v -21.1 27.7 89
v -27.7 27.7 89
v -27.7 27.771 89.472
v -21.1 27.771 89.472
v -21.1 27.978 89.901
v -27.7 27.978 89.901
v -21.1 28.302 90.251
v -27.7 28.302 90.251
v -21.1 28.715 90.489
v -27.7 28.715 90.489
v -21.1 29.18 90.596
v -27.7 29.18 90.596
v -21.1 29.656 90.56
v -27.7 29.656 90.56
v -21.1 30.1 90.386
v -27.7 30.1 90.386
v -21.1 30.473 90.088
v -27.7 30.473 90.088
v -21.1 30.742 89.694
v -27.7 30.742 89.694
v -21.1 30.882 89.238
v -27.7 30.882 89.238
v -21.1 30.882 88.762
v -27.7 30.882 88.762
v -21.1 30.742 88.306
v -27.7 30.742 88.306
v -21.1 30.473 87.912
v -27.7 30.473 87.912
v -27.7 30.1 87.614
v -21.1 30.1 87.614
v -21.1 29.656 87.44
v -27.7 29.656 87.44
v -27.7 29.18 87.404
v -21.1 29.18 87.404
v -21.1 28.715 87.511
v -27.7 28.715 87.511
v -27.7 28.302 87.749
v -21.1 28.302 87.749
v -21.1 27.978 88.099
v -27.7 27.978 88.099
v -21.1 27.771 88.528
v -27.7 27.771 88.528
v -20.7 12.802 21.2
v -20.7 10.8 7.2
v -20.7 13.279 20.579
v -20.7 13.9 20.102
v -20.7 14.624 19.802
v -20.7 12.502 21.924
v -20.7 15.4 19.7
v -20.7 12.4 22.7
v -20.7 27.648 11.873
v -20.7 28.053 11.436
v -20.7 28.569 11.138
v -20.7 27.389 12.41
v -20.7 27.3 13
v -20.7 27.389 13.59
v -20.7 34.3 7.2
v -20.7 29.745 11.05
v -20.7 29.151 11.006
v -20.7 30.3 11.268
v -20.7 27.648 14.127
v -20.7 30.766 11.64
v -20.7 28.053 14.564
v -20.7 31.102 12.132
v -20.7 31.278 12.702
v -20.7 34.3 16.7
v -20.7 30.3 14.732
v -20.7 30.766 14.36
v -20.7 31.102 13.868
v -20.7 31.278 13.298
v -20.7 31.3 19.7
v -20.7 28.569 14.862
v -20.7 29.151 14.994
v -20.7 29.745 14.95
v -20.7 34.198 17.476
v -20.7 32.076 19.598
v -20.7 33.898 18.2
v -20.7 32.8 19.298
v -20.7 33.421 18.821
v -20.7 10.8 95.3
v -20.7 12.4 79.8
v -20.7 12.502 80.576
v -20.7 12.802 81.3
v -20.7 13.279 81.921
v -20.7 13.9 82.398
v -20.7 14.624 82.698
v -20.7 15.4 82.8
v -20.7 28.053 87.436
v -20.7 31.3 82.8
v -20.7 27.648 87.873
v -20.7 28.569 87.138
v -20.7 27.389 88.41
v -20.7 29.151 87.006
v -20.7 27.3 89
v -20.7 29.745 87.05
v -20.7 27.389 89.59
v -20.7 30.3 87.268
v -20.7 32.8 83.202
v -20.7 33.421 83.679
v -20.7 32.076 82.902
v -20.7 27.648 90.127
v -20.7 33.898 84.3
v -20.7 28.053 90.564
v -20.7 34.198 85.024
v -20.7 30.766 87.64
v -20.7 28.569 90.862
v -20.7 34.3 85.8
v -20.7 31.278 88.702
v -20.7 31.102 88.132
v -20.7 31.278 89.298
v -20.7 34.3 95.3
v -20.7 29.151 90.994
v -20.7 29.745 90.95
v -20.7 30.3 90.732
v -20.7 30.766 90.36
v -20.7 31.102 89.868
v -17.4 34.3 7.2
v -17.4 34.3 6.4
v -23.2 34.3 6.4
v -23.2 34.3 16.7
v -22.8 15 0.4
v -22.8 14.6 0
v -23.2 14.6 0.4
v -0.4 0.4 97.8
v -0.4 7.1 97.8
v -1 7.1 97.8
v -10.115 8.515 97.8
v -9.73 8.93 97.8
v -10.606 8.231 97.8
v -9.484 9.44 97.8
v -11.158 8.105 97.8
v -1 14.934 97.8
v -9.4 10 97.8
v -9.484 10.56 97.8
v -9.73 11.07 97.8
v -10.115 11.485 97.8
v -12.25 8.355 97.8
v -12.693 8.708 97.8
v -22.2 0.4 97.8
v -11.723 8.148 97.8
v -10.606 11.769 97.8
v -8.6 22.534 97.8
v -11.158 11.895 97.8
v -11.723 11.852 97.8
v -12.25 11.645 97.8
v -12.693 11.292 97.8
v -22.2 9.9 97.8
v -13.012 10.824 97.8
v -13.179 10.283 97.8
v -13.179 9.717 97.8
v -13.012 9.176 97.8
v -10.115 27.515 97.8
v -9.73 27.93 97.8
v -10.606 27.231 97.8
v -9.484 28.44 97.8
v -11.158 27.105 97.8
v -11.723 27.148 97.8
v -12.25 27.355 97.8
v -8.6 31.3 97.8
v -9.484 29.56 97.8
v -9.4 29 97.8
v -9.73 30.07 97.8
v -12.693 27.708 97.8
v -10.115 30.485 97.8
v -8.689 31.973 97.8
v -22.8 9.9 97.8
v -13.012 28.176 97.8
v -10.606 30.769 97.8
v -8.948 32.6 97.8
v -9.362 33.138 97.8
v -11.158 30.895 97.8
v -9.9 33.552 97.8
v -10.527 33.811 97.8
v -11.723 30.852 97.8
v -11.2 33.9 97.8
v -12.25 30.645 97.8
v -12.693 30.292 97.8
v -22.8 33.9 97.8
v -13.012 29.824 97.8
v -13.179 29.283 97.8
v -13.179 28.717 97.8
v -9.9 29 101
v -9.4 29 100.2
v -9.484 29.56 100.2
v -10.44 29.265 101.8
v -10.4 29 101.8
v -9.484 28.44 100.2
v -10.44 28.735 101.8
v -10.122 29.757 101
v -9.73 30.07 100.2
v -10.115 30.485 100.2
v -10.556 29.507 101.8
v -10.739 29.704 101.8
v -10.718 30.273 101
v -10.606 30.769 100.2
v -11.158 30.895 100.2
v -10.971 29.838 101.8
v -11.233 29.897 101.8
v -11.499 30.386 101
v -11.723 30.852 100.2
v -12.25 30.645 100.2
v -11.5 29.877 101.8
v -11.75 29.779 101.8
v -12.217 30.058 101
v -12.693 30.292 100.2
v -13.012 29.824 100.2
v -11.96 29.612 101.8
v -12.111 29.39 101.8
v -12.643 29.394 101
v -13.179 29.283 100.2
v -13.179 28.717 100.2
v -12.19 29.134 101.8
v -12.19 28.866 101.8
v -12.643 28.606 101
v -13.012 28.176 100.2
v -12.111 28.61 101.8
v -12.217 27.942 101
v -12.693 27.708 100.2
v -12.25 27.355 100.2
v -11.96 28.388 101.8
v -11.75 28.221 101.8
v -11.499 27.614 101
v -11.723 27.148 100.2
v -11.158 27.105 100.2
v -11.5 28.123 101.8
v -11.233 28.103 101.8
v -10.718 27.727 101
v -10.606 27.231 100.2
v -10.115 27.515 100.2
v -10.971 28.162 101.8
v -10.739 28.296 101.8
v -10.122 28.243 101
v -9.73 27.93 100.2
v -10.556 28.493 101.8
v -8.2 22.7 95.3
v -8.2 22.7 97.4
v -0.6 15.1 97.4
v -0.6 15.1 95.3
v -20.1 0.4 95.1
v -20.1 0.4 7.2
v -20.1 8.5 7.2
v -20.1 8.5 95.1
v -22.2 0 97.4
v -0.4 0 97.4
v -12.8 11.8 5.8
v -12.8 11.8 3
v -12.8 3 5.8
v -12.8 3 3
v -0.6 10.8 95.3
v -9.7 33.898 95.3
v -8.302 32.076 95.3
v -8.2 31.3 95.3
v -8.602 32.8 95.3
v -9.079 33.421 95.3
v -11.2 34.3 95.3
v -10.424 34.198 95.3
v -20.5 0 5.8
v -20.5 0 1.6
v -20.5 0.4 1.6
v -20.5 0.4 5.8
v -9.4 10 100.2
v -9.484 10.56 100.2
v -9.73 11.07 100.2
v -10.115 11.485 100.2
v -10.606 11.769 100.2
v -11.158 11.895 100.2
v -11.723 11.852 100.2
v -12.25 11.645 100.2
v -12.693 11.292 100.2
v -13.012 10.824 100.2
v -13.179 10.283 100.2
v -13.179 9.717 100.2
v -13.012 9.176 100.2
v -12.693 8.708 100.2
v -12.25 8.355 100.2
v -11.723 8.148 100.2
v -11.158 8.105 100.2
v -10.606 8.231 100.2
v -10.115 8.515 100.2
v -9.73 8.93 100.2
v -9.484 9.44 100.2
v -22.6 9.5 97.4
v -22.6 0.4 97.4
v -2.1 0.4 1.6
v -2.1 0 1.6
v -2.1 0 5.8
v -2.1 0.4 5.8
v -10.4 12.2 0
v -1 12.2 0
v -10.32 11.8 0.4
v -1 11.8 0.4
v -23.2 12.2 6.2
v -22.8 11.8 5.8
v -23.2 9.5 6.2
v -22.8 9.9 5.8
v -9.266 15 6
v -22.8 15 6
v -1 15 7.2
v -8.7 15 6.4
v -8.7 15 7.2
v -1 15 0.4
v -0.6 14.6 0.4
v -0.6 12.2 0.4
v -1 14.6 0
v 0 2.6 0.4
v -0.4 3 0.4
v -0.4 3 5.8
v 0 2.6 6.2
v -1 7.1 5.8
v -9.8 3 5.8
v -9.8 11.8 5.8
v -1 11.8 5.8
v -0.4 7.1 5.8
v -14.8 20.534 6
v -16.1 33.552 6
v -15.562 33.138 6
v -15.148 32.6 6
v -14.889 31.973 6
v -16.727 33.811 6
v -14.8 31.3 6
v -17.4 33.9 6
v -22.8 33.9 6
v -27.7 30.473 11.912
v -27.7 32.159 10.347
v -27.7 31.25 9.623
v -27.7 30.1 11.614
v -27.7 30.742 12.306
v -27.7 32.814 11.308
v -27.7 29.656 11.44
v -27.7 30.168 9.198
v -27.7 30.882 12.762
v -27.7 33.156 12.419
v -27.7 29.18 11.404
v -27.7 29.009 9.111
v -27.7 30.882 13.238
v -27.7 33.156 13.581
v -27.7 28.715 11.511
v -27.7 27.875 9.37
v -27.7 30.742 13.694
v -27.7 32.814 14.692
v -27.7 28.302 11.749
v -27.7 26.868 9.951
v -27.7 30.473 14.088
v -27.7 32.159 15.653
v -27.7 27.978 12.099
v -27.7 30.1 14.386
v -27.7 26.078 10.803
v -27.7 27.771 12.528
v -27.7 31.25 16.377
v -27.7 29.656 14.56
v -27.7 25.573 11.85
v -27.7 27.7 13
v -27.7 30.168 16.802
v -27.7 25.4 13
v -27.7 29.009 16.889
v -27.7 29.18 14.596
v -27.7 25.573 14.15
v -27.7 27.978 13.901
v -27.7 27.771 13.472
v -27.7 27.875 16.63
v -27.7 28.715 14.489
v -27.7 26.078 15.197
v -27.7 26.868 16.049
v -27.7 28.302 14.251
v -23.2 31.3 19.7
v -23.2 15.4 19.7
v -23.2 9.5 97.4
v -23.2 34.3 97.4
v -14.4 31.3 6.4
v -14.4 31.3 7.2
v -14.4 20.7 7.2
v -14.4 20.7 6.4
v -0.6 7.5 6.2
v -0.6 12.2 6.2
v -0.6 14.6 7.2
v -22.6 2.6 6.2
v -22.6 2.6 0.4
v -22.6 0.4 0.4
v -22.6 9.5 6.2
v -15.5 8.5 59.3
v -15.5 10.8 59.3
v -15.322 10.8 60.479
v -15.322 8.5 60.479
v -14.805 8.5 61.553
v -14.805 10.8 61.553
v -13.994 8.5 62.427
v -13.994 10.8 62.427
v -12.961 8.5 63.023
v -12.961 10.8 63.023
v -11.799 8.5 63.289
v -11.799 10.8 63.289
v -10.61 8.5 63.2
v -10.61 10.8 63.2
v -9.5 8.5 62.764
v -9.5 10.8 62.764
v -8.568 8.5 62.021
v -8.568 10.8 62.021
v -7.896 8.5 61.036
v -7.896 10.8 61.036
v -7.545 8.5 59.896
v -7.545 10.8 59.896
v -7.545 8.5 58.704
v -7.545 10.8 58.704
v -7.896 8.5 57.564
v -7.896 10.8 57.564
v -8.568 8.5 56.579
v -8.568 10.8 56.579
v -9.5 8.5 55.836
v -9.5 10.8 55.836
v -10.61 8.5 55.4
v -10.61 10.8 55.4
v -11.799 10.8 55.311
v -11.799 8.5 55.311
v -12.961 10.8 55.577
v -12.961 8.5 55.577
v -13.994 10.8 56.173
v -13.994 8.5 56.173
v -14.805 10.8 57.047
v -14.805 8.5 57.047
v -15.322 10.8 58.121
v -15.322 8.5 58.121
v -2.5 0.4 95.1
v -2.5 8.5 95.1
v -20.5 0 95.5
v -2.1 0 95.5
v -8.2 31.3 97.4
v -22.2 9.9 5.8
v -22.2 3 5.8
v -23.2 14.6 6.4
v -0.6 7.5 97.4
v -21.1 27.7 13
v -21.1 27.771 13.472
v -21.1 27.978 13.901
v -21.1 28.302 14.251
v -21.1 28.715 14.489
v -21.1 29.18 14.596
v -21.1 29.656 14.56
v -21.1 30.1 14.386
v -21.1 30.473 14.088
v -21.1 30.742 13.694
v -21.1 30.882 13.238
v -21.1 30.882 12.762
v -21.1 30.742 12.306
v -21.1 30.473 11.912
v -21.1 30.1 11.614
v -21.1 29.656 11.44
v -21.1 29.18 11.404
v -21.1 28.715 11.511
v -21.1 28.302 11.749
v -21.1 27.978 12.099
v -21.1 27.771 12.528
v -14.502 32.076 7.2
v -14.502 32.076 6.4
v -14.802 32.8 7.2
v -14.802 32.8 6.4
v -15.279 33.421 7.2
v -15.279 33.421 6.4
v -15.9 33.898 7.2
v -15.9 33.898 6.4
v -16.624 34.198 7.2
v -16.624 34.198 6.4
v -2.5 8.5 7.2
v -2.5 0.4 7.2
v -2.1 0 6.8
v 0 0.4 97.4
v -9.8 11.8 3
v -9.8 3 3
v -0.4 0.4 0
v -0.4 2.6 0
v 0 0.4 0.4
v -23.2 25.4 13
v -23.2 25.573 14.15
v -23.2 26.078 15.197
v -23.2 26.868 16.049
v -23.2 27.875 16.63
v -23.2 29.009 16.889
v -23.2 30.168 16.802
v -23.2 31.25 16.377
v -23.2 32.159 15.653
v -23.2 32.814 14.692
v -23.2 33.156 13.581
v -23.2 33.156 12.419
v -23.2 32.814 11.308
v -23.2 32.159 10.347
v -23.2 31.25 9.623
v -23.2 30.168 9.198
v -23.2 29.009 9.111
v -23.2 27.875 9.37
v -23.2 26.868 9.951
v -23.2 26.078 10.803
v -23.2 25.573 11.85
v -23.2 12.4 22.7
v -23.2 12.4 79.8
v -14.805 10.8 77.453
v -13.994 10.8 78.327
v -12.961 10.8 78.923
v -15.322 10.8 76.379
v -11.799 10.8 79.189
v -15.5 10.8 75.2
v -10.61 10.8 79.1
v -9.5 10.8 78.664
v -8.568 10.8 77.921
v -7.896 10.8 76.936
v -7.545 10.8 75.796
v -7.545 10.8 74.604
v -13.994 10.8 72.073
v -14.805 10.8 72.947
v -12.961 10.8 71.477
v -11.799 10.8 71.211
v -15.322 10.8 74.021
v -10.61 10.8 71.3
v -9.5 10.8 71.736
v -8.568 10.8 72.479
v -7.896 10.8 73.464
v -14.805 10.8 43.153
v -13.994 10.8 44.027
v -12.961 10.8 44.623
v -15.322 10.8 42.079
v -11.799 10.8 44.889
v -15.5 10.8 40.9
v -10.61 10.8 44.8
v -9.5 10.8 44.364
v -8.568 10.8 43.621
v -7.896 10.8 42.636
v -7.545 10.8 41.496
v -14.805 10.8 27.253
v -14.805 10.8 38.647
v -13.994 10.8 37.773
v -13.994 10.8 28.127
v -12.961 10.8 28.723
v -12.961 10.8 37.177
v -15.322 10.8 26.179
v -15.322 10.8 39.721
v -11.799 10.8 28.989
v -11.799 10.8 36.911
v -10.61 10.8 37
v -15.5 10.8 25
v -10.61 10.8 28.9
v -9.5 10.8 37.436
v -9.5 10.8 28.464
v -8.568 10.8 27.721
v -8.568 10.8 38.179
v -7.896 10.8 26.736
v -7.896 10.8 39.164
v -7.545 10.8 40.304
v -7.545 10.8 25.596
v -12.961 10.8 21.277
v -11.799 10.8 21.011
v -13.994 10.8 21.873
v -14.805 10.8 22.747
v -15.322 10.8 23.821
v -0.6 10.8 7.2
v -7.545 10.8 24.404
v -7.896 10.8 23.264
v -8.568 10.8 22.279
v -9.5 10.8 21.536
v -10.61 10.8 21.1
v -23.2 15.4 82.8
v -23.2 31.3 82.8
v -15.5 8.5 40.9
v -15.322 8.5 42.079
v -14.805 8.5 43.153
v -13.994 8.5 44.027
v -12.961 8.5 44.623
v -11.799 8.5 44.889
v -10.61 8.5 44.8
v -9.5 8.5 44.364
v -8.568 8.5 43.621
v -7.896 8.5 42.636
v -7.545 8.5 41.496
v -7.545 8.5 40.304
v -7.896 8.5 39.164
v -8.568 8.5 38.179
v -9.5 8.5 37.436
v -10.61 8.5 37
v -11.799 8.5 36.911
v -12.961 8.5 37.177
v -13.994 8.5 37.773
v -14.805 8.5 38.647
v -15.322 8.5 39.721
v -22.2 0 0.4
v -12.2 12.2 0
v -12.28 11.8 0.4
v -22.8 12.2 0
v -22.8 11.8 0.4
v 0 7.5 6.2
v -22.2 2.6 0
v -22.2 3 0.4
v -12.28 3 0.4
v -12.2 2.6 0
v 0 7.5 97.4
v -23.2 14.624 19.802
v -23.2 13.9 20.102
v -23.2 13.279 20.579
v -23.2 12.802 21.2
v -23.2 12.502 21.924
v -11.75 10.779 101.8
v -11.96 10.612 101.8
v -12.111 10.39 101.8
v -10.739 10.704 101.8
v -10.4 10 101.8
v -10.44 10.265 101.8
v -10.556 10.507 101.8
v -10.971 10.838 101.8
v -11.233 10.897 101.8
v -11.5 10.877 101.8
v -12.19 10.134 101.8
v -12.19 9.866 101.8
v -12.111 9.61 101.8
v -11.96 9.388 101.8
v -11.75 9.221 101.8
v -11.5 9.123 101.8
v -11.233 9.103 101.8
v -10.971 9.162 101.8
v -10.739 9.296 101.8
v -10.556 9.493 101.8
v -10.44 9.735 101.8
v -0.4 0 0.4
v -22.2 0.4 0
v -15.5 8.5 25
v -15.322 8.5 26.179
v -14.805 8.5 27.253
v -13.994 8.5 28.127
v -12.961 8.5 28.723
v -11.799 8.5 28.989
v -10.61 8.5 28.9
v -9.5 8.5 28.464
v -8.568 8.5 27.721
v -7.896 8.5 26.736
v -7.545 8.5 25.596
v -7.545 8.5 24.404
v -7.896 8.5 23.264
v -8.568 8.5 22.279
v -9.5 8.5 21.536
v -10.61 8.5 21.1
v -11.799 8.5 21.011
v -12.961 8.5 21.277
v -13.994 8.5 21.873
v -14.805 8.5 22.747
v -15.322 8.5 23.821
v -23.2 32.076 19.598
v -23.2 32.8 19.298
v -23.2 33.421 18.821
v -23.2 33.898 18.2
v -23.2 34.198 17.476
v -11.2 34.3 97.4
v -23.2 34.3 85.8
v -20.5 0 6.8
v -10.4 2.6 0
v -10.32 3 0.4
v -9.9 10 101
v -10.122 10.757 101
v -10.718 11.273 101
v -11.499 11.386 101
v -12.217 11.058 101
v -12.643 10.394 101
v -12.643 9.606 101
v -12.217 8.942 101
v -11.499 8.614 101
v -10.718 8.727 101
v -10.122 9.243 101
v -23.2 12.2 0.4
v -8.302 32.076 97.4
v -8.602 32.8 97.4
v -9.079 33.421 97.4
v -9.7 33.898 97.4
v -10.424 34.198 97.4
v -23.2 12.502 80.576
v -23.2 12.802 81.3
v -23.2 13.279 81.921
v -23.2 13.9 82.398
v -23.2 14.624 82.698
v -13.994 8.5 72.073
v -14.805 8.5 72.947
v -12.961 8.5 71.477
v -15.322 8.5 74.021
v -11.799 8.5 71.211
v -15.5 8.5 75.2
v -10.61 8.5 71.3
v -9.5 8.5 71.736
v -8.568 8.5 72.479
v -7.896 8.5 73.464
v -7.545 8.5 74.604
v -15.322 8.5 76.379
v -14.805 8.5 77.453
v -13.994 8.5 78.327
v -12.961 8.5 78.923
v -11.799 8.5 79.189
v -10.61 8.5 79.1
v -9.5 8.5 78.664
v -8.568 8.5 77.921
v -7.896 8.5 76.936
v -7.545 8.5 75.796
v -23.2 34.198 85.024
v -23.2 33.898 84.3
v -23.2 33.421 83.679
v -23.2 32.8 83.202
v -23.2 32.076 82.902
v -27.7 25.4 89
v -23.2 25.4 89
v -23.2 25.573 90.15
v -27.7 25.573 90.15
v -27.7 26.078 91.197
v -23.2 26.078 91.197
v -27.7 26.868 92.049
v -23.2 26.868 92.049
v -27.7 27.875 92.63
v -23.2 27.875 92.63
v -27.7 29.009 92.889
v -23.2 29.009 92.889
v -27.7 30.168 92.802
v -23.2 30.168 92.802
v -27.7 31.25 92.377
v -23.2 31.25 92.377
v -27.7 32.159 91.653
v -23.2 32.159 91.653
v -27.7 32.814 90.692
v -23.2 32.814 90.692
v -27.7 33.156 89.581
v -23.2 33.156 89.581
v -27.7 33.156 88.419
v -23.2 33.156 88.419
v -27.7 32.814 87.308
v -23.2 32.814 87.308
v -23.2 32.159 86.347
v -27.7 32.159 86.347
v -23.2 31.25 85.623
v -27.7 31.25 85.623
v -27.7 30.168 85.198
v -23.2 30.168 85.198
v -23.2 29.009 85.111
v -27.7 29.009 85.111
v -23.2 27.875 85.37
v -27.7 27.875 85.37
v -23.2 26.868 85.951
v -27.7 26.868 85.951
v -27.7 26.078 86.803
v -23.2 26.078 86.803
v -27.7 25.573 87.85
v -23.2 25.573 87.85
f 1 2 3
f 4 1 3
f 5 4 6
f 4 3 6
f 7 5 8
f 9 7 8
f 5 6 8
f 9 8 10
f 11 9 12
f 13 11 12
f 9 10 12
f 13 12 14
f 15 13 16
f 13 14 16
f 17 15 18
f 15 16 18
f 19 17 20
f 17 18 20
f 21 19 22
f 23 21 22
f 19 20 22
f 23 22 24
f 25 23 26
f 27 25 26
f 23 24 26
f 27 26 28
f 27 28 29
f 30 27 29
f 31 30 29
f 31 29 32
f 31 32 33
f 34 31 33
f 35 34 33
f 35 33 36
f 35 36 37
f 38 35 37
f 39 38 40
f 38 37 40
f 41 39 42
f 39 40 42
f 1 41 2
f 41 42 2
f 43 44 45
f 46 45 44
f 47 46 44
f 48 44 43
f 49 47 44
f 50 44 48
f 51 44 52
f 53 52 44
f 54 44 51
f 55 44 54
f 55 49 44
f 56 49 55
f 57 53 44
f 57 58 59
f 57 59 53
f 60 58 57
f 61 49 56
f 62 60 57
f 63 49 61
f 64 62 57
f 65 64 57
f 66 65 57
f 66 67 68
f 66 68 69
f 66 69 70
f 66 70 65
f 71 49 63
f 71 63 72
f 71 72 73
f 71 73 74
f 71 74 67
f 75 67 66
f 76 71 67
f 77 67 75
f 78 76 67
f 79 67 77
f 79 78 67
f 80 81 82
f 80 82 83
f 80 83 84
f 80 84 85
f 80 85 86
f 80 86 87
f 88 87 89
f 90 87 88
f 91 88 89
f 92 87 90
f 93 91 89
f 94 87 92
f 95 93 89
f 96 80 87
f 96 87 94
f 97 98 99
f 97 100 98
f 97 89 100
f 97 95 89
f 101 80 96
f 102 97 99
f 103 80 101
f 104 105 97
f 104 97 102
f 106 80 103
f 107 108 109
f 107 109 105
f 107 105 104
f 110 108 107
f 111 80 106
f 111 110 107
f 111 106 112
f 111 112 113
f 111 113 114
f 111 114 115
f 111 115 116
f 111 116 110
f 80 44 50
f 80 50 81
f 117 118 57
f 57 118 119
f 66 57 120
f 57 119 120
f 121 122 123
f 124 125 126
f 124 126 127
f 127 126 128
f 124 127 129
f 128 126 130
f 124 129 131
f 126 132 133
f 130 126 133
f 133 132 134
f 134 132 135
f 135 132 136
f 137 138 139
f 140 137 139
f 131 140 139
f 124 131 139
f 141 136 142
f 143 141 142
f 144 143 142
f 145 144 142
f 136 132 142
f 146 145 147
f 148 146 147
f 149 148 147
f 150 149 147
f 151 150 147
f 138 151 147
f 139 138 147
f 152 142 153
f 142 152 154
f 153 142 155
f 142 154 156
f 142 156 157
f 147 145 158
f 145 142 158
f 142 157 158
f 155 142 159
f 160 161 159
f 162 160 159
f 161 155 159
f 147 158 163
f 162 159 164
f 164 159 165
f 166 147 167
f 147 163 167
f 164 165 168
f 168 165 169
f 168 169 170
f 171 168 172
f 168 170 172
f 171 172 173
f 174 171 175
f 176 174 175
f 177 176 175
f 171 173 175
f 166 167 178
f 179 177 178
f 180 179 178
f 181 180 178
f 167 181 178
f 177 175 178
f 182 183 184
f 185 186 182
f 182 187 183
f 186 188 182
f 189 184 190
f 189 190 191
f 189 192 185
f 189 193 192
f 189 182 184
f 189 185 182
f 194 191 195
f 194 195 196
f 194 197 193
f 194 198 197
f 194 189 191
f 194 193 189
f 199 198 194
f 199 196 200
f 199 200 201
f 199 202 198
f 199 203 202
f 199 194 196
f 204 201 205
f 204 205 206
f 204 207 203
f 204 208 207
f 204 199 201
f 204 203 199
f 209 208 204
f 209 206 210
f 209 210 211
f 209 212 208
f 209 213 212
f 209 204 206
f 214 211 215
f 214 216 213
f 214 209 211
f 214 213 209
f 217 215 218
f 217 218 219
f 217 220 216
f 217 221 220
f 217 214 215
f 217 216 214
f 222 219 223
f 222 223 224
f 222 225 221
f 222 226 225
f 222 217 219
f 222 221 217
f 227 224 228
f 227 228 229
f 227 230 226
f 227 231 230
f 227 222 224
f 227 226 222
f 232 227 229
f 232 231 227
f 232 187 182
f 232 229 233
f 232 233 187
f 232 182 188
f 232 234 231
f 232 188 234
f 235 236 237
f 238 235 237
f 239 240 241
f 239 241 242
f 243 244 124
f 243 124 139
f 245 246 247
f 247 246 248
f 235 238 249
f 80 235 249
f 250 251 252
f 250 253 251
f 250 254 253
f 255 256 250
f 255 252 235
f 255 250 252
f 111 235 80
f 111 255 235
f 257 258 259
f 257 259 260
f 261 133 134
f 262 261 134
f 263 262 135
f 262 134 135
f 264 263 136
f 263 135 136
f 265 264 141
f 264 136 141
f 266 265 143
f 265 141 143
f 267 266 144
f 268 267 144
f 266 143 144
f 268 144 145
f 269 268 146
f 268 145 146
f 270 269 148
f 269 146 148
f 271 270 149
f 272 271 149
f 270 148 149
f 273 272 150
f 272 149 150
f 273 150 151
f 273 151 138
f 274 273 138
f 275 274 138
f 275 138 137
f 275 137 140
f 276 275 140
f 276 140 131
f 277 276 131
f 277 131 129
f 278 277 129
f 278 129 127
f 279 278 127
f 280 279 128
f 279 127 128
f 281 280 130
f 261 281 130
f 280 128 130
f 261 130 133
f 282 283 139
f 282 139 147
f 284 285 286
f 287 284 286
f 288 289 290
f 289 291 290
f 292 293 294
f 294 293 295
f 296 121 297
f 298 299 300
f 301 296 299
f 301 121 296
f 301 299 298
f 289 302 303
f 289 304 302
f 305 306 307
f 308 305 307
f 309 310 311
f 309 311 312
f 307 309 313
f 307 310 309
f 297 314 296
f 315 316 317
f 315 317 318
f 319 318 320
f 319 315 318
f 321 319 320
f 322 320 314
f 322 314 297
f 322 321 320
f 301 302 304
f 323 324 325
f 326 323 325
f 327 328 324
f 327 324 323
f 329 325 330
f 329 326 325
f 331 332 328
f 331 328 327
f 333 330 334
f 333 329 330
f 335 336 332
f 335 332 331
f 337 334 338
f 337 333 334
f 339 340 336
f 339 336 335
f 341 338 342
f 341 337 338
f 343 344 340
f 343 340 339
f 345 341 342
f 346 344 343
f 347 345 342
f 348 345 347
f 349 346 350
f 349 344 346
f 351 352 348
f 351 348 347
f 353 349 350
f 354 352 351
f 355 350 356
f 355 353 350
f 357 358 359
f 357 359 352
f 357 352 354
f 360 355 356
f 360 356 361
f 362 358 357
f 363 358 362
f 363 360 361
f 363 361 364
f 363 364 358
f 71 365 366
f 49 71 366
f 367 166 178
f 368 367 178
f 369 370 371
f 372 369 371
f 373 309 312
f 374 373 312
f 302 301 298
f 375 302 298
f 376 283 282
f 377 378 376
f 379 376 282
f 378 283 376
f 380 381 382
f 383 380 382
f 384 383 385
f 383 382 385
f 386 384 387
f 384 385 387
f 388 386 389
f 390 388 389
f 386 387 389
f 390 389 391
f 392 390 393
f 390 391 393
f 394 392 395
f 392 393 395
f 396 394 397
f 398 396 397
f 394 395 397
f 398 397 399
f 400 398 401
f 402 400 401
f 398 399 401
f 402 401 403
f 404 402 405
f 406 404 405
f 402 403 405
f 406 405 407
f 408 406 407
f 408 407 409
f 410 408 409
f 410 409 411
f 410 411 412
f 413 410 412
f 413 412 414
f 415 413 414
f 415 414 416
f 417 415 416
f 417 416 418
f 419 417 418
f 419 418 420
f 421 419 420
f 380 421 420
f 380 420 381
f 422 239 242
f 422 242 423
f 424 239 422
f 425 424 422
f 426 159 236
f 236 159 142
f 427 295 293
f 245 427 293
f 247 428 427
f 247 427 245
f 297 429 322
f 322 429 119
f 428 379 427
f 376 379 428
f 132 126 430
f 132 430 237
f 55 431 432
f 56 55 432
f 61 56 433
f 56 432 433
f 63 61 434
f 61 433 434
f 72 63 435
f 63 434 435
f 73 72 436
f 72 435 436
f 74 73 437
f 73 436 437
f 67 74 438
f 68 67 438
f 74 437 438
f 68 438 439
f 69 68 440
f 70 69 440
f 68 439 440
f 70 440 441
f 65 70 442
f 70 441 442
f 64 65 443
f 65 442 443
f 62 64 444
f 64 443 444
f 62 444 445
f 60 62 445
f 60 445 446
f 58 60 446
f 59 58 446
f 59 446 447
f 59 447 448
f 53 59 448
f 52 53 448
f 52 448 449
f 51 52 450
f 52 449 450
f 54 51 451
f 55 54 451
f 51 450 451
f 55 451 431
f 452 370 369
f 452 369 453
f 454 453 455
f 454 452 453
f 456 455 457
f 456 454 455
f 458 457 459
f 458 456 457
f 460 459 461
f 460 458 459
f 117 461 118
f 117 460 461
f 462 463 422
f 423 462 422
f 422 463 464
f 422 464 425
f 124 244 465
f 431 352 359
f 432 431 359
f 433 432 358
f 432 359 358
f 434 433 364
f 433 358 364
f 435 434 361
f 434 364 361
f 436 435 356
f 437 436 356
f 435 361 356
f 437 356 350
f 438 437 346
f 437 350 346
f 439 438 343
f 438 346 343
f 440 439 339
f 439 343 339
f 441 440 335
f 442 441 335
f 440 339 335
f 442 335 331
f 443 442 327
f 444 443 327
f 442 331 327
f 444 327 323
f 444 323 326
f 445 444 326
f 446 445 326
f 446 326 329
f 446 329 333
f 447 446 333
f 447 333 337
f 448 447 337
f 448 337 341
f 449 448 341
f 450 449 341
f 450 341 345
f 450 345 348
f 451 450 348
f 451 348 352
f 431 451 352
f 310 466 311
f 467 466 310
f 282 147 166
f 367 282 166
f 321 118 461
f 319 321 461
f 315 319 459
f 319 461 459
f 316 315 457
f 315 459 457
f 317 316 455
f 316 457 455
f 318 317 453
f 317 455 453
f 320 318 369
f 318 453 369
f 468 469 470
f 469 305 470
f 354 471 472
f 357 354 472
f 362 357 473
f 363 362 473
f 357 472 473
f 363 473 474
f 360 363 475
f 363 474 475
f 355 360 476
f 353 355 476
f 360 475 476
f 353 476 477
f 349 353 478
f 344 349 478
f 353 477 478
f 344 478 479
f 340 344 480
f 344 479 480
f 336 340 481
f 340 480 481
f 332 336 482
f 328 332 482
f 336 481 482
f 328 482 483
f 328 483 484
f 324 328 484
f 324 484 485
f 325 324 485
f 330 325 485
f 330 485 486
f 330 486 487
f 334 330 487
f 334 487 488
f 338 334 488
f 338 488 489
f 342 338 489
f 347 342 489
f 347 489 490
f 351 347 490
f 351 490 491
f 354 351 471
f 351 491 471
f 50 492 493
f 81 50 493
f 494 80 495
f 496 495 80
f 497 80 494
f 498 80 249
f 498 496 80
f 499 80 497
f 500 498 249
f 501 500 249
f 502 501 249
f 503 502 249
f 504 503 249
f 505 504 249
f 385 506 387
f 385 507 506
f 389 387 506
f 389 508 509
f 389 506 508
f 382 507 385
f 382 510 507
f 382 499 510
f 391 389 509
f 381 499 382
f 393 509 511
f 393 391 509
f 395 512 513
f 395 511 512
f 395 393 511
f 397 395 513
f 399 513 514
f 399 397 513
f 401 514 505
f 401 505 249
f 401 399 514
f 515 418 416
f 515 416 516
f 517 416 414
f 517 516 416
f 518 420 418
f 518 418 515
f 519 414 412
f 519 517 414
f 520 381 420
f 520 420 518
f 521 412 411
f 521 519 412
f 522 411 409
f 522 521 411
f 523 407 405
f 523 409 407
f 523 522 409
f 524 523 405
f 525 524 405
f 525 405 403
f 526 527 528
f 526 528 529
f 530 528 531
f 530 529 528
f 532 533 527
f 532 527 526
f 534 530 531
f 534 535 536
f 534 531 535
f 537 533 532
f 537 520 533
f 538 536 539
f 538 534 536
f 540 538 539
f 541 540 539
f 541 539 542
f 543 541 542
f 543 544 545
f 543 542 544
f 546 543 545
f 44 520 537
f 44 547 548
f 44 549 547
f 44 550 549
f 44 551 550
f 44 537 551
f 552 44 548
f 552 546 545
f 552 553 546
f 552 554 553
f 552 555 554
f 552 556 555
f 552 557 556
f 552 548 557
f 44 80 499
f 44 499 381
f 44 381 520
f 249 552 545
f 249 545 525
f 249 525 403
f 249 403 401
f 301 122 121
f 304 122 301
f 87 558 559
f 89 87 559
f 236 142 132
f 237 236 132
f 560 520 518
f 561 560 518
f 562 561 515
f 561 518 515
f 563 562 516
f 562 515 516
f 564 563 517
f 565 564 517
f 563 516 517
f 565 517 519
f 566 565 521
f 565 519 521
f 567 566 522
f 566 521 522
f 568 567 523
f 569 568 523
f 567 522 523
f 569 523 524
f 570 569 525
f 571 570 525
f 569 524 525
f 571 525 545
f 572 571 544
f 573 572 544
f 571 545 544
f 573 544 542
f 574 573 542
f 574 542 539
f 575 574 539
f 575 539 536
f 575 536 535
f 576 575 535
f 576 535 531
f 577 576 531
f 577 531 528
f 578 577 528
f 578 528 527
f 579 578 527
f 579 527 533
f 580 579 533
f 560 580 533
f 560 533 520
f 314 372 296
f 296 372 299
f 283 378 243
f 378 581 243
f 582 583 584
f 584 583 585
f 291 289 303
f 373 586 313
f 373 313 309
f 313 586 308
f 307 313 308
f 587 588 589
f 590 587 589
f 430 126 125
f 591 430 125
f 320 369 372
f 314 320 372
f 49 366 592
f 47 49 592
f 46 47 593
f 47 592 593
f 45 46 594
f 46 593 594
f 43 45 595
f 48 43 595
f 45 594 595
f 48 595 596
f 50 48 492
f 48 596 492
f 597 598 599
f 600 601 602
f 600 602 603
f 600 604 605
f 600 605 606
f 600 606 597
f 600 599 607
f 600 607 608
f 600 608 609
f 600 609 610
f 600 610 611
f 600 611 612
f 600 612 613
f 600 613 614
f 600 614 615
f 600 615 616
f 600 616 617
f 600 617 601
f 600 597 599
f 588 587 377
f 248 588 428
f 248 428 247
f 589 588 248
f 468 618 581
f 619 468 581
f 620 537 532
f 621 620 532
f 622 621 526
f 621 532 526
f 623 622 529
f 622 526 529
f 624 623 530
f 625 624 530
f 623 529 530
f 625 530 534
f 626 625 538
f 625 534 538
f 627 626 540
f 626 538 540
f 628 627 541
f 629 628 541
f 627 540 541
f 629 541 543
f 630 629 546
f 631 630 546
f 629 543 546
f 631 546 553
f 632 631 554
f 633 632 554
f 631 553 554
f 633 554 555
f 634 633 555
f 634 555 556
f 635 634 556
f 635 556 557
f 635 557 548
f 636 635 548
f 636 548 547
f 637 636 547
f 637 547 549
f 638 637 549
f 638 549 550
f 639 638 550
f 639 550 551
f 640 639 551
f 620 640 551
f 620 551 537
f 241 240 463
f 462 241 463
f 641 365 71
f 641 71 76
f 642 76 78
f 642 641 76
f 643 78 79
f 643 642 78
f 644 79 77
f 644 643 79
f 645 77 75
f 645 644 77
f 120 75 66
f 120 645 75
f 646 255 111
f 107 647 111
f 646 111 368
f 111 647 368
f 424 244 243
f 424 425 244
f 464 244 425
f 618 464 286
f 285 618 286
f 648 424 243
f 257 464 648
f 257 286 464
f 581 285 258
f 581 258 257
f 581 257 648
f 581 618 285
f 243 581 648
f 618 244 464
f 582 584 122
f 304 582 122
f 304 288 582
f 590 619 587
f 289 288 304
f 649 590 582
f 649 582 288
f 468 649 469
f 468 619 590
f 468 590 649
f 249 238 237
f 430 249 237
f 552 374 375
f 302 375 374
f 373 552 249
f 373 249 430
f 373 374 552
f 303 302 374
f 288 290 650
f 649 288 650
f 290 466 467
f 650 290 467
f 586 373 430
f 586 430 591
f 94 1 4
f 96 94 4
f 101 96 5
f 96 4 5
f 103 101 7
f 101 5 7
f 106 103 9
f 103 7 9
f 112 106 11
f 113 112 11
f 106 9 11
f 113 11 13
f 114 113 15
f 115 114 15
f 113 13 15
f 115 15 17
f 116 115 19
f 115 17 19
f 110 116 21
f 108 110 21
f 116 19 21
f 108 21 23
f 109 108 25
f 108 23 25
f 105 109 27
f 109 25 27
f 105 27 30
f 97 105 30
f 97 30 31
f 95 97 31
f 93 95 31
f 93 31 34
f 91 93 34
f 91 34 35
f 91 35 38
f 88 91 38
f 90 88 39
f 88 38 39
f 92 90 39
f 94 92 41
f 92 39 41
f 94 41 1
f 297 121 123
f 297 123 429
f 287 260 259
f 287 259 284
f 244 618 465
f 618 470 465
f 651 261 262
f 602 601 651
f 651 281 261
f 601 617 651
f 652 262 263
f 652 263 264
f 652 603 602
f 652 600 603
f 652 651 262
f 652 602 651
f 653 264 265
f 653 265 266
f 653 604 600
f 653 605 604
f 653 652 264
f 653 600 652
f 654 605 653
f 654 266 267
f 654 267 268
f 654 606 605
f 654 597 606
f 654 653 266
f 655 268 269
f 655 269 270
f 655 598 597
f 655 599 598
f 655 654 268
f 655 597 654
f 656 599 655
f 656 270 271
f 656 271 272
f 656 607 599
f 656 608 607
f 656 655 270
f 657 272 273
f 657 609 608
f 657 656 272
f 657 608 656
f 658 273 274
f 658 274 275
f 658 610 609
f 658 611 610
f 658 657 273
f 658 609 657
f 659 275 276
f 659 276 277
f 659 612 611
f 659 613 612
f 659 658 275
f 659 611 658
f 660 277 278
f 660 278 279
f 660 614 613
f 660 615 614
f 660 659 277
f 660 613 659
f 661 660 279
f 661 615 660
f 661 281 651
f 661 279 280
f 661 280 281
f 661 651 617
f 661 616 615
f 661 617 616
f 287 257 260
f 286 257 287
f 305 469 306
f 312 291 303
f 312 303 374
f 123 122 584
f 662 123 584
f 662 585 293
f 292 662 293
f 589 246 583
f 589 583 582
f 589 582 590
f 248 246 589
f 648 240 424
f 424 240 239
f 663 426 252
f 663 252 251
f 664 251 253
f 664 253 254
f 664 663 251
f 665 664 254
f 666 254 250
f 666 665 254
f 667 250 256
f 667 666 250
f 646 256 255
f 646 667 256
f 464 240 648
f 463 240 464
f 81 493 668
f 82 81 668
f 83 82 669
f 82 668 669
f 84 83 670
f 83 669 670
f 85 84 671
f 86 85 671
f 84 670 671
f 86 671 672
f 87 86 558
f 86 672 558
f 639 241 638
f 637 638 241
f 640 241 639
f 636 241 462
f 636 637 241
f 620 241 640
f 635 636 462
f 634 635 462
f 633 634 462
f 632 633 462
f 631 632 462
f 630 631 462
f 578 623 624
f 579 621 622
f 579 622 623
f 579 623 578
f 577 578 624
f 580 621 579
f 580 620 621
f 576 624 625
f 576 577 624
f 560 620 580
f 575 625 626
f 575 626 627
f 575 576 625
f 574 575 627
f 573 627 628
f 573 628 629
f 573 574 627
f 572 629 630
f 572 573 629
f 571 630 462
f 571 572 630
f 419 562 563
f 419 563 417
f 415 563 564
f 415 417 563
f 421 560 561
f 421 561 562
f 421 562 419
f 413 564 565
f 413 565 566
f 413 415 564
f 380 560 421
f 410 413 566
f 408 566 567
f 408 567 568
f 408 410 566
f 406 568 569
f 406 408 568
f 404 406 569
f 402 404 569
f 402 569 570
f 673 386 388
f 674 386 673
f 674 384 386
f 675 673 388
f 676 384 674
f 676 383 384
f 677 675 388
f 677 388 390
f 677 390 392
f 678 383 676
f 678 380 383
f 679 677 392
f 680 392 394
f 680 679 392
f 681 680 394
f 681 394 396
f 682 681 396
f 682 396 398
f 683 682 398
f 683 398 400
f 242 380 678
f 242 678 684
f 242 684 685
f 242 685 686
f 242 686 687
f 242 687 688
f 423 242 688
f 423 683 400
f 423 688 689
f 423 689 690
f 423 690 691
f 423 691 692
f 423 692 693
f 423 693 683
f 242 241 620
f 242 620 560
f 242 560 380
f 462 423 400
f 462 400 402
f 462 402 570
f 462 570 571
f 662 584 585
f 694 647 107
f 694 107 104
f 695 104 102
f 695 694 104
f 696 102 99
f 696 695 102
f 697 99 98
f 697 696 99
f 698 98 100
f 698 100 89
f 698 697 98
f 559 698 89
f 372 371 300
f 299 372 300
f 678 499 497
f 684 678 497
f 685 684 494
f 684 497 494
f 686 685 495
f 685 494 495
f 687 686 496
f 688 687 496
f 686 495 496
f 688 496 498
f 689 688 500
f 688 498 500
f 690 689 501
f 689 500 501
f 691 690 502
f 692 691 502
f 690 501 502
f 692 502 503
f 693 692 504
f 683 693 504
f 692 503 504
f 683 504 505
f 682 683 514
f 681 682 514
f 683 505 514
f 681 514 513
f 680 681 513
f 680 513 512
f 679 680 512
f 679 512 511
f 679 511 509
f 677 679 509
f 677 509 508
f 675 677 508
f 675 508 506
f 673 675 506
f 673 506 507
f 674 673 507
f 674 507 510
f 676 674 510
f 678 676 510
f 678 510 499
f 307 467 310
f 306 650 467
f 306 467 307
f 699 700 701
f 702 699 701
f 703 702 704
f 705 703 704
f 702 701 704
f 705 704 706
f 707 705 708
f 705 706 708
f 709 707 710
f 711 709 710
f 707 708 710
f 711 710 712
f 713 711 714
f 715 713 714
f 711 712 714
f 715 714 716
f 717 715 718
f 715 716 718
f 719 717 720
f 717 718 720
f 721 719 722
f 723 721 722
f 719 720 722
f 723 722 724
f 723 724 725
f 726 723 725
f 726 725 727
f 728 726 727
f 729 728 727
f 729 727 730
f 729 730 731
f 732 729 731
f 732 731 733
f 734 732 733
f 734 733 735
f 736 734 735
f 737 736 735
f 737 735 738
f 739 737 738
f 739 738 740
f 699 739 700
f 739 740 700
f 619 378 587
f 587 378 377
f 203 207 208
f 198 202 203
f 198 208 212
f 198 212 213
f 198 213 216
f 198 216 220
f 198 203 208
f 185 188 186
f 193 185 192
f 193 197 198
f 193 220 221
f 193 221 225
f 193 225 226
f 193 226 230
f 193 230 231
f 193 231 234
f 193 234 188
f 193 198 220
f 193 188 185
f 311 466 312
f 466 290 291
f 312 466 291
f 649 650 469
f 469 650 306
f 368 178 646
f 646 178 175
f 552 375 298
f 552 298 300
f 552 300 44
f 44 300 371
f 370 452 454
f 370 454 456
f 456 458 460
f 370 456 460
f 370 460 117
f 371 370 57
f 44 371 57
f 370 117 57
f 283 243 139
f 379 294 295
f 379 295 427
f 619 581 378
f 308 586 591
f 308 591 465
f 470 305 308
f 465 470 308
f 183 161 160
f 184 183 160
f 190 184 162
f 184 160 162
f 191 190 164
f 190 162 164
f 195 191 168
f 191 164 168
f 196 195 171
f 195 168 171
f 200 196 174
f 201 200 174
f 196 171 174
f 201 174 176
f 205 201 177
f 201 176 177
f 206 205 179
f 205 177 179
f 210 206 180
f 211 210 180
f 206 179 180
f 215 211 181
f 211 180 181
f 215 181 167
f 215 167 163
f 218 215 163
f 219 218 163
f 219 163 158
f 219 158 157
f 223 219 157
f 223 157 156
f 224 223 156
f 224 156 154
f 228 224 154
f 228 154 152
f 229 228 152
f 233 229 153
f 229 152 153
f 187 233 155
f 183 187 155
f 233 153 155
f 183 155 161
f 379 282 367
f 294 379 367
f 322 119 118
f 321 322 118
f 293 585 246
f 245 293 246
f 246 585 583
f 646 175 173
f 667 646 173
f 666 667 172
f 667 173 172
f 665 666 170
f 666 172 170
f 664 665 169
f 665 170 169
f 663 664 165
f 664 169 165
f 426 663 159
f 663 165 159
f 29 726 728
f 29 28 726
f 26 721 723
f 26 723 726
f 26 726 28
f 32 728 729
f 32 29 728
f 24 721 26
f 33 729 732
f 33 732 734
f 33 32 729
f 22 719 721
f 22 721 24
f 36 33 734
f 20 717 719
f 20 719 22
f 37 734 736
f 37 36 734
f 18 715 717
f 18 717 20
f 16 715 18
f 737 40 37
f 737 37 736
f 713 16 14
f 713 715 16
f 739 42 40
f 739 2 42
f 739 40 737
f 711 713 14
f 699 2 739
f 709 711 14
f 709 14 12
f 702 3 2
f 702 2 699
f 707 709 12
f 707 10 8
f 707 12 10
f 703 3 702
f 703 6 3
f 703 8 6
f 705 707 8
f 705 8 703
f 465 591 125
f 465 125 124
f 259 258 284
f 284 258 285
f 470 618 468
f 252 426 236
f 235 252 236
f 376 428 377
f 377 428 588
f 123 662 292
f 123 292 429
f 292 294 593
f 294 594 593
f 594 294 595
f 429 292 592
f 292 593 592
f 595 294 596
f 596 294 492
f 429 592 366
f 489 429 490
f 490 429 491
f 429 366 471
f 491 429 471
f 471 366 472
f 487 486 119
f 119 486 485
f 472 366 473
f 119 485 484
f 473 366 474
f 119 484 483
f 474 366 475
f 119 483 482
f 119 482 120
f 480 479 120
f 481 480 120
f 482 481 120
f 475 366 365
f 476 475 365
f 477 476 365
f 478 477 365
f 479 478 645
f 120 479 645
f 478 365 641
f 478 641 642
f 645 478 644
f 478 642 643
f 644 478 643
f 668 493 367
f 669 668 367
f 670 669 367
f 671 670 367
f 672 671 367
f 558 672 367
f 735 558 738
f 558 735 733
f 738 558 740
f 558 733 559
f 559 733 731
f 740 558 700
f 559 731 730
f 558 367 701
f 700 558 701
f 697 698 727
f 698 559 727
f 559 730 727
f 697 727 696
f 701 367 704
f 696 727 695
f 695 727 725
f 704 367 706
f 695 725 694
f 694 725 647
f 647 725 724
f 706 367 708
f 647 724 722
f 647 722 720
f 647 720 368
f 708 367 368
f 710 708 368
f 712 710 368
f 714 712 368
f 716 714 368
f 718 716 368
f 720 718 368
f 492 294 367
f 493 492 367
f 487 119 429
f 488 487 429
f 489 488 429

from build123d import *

# Parameters (mm, degrees)
PAD_DEPTH          = 97.8
PAD001_DEPTH       = 2.5
SKETCH002_W        = 22.6
SKETCH002_H        = 4.2
PAD002_DEPTH       = 7.2
PAD003_DEPTH       = 1.2
PAD004_DEPTH       = 2.5
SKETCH005_W        = 10.4
SKETCH005_H        = 8.8
SKETCH005_W_2      = 9.8
POCKET_DEPTH       = 5.8
CHAMFER_SIZE2      = 3
CHAMFER_SIZE       = 0.6
CHAMFER001_SIZE2   = 3
CHAMFER001_SIZE    = 0.6
SKETCH006_R        = 3.9
PAD005_DEPTH       = 4.5
SKETCH007_R        = 1.6
POCKET001_DEPTH    = 5
SKETCH008_R        = 1.9
PAD006_DEPTH       = 4
CHAMFER002_1_SIZE2 = 1
CHAMFER002_1_SIZE  = 1.6
CHAMFER002_2_SIZE2 = 1
CHAMFER002_2_SIZE  = 1.6
SKETCH009_W        = 18.4
SKETCH009_H        = 4.2
POCKET002_DEPTH    = 0.4
SKETCH010_W        = 17.6
SKETCH010_H        = 87.9
POCKET003_DEPTH    = 8.5
CHAMFER003_SIZE    = 0.4
CHAMFER004_SIZE    = 0.4
CHAMFER005_SIZE    = 0.4
SKETCH011_R        = 4
POCKET004_DEPTH    = 5


with BuildPart() as part:
    # Sketch → Pad (new body)
    with BuildSketch(Plane.XY):
        Polygon((-22.6, 0), (-22.6, 9.5), (-23.2, 9.5), (-23.2, 10.8), (-0.6, 10.8), (-0.6, 7.5), (0, 7.5), (0, 0), align=None)
    extrude(amount=PAD_DEPTH)

    # Sketch001 (on Face10 of Pad) → Pad001 (join)
    with BuildSketch(Plane.XY.offset(97.8)):
        with BuildLine():
            Line((-23.2, 10.8), (-23.2, 34.3))
            Line((-23.2, 34.3), (-11.2, 34.3))
            ThreePointArc((-8.2, 31.3), (-9.07868, 33.42132), (-11.2, 34.3))
            Line((-8.2, 31.3), (-8.2, 22.7))
            Line((-8.2, 22.7), (-0.6, 15.1))
            Line((-0.6, 15.1), (-0.6, 10.8))
            Line((-0.6, 10.8), (-23.2, 10.8))
        make_face()
    extrude(amount=-PAD001_DEPTH)

    # Sketch002 (on Face4 of Pad001) → Pad002 (join)
    with BuildSketch(Plane(origin=(0, 0, 0), x_dir=(1, 0, 0), z_dir=(0, 0, -1))):
        with Locations((-11.9, -12.9)):
            Rectangle(SKETCH002_W, SKETCH002_H)
    extrude(amount=-PAD002_DEPTH)

    # Sketch003 (on Face22 of Pad002) → Pad003 (join)
    with BuildSketch(Plane.XY.offset(7.2)):
        with BuildLine():
            Line((-23.2, 15), (-23.2, 34.3))
            Line((-23.2, 34.3), (-17.4, 34.3))
            ThreePointArc((-14.4, 31.3), (-15.27868, 33.42132), (-17.4, 34.3))
            Line((-14.4, 31.3), (-14.4, 20.7))
            Line((-14.4, 20.7), (-8.7, 15))
            Line((-8.7, 15), (-23.2, 15))
        make_face()
    extrude(amount=-PAD003_DEPTH)

    # Sketch004 (on Face7 of Pad003) → Pad004 (join)
    with BuildSketch(Plane(origin=(-23.2, 0, 0), x_dir=(0, -1, 0), z_dir=(-1, 0, 0))):
        with BuildLine():
            Line((-34.3, 7.2), (-34.3, 16.7))
            ThreePointArc((-31.3, 19.7), (-33.42132, 18.82132), (-34.3, 16.7))
            Line((-31.3, 19.7), (-15.4, 19.7))
            ThreePointArc((-15.4, 19.7), (-13.27868, 20.57868), (-12.4, 22.7))
            Line((-12.4, 22.7), (-12.4, 79.8))
            ThreePointArc((-12.4, 79.8), (-13.27868, 81.92132), (-15.4, 82.8))
            Line((-15.4, 82.8), (-31.3, 82.8))
            ThreePointArc((-34.3, 85.8), (-33.42132, 83.67868), (-31.3, 82.8))
            Line((-34.3, 85.8), (-34.3, 95.3))
            Line((-34.3, 95.3), (-10.8, 95.3))
            Line((-10.8, 95.3), (-10.8, 7.2))
            Line((-10.8, 7.2), (-34.3, 7.2))
        make_face()
    extrude(amount=-PAD004_DEPTH)

    # Sketch005 (on Face4 of Pad004) → Pocket (cut)
    with BuildSketch(Plane(origin=(0, 0, 0), x_dir=(1, 0, 0), z_dir=(0, 0, -1))):
        with Locations((-18, -7.4)):
            Rectangle(SKETCH005_W, SKETCH005_H)
        with Locations((-4.9, -7.4)):
            Rectangle(SKETCH005_W_2, SKETCH005_H)
    extrude(amount=-POCKET_DEPTH, mode=Mode.SUBTRACT)

    # Chamfer
    chamfer_edges = [part.edges().sort_by_distance(p)[0] for p in [
        (-9.8, 6.9, 0),
    ]]
    chamfer_side = part.faces().sort_by_distance((-11.3, 2.885526, 0))[0]
    chamfer(chamfer_edges, length=CHAMFER_SIZE, length2=CHAMFER_SIZE2, reference=chamfer_side)

    # Chamfer001
    chamfer001_edges = [part.edges().sort_by_distance(p)[0] for p in [
        (-12.8, 6.9, 0),
    ]]
    chamfer001_side = part.faces().sort_by_distance((-11.36491, 2.668377, 0))[0]
    chamfer(chamfer001_edges, length=CHAMFER001_SIZE, length2=CHAMFER001_SIZE2, reference=chamfer001_side)

    # Sketch006 (on Face25 of Chamfer001) → Pad005 (join)
    with BuildSketch(Plane(origin=(-23.2, 0, 0), x_dir=(0, -1, 0), z_dir=(-1, 0, 0))):
        with Locations((-29.3, 89)):
            Circle(SKETCH006_R)
        with Locations((-29.3, 13)):
            Circle(SKETCH006_R)
    extrude(amount=PAD005_DEPTH)

    # Sketch007 (on Face25 of Pad005) → Pocket001 (cut, symmetric)
    with BuildSketch(Plane(origin=(-23.2, 0, 0), x_dir=(0, -1, 0), z_dir=(-1, 0, 0))):
        with Locations((-29.3, 13)):
            Circle(SKETCH007_R)
        with Locations((-29.3, 89)):
            Circle(SKETCH007_R)
    extrude(amount=POCKET001_DEPTH, both=True, mode=Mode.SUBTRACT)

    # Sketch008 (on Face22 of Pocket001) → Pad006 (join)
    with BuildSketch(Plane.XY.offset(97.8)):
        with Locations((-11.3, 10)):
            Circle(SKETCH008_R)
        with Locations((-11.3, 29)):
            Circle(SKETCH008_R)
    extrude(amount=PAD006_DEPTH)

    # Chamfer002 1
    chamfer002_1_edges = [part.edges().sort_by_distance(p)[0] for p in [
        (-13.2, 29, 101.8),
    ]]
    chamfer002_1_side = part.faces().sort_by_distance((-13.2, 29, 99.8))[0]
    chamfer(chamfer002_1_edges, length=CHAMFER002_1_SIZE, length2=CHAMFER002_1_SIZE2, reference=chamfer002_1_side)

    # Chamfer002 2
    chamfer002_2_edges = [part.edges().sort_by_distance(p)[0] for p in [
        (-13.2, 10, 101.8),
    ]]
    chamfer002_2_side = part.faces().sort_by_distance((-13.2, 10, 99.8))[0]
    chamfer(chamfer002_2_edges, length=CHAMFER002_2_SIZE, length2=CHAMFER002_2_SIZE2, reference=chamfer002_2_side)

    # Sketch009 (on Face12 of Chamfer002) → Pocket002 (cut)
    with BuildSketch(Plane.XZ):
        with Locations((-11.3, 3.7)):
            Rectangle(SKETCH009_W, SKETCH009_H)
    extrude(amount=-POCKET002_DEPTH, mode=Mode.SUBTRACT)

    # Sketch010 (on Face12 of Pocket002) → Pocket003 (cut)
    with BuildSketch(Plane.XZ):
        with Locations((-11.3, 51.15)):
            Rectangle(SKETCH010_W, SKETCH010_H)
    extrude(amount=-POCKET003_DEPTH, mode=Mode.SUBTRACT)

    # Chamfer003
    chamfer003_edges = [part.edges().sort_by_distance(p)[0] for p in [
        (-20.7, 30.9, 13),
        (-20.7, 30.9, 89),
    ]]
    chamfer(chamfer003_edges, length=CHAMFER003_SIZE)

    # Chamfer004
    chamfer004_edges = [part.edges().sort_by_distance(p)[0] for p in [
        (-22.6, 0, 48.9),
        (0, 0, 48.9),
        (-20.1, 0, 51.15),
        (-11.3, 0, 95.1),
        (-2.5, 0, 51.15),
        (-11.3, 0, 7.2),
        (-11.3, 0, 0),
        (0, 1.5, 0),
        (-22.6, 1.5, 0),
        (-17.7, 3, 0),
        (-4.9, 3, 0),
        (-5.2, 11.8, 0),
        (-0.6, 13.4, 0),
        (-0.6, 15, 3.6),
        (-11.9, 15, 0),
        (-18, 11.8, 0),
        (-23.2, 13.4, 0),
        (-23.2, 15, 3),
        (-11.3, 0, 97.8),
        (-22.6, 4.75, 97.8),
        (-22.9, 9.5, 97.8),
        (-23.2, 10.15, 97.8),
        (-23.2, 22.55, 97.8),
        (0, 3.75, 97.8),
        (-0.3, 7.5, 97.8),
        (-0.6, 9.15, 97.8),
        (-0.6, 12.95, 97.8),
        (-4.4, 18.9, 97.8),
        (-8.2, 27, 97.8),
        (0, 3, 2.9),
        (0, 5.25, 5.8),
        (-0.3, 7.5, 5.8),
        (-0.6, 9.15, 5.8),
        (-0.6, 11.3, 5.8),
        (-0.6, 11.8, 2.9),
        (-22.6, 3, 2.9),
        (-22.6, 6.25, 5.8),
        (-22.9, 9.5, 5.8),
        (-23.2, 10.15, 5.8),
        (-23.2, 11.3, 5.8),
        (-23.2, 11.8, 2.9),
    ]]
    chamfer(chamfer004_edges, length=CHAMFER004_SIZE)

    # Chamfer005
    chamfer005_edges = [part.edges().sort_by_distance(p)[0] for p in [
        (-11.55, 17.85, 6),
        (-14.4, 26, 6),
        (-15.27868, 33.42132, 6),
        (-20.3, 34.3, 6),
        (-23.2, 24.65, 6),
    ]]
    chamfer(chamfer005_edges, length=CHAMFER005_SIZE)

    # Sketch011 (on Face22 of Chamfer005) → Pocket004 (cut)
    with BuildSketch(Plane(origin=(0, 10.8, 0), x_dir=(-1, 0, 0), z_dir=(0, 1, 0))):
        with Locations((11.5, 25)):
            Circle(SKETCH011_R)
        with Locations((11.5, 40.9)):
            Circle(SKETCH011_R)
        with Locations((11.5, 59.3)):
            Circle(SKETCH011_R)
        with Locations((11.5, 75.2)):
            Circle(SKETCH011_R)
    extrude(amount=-POCKET004_DEPTH, mode=Mode.SUBTRACT)


solid = part.part
